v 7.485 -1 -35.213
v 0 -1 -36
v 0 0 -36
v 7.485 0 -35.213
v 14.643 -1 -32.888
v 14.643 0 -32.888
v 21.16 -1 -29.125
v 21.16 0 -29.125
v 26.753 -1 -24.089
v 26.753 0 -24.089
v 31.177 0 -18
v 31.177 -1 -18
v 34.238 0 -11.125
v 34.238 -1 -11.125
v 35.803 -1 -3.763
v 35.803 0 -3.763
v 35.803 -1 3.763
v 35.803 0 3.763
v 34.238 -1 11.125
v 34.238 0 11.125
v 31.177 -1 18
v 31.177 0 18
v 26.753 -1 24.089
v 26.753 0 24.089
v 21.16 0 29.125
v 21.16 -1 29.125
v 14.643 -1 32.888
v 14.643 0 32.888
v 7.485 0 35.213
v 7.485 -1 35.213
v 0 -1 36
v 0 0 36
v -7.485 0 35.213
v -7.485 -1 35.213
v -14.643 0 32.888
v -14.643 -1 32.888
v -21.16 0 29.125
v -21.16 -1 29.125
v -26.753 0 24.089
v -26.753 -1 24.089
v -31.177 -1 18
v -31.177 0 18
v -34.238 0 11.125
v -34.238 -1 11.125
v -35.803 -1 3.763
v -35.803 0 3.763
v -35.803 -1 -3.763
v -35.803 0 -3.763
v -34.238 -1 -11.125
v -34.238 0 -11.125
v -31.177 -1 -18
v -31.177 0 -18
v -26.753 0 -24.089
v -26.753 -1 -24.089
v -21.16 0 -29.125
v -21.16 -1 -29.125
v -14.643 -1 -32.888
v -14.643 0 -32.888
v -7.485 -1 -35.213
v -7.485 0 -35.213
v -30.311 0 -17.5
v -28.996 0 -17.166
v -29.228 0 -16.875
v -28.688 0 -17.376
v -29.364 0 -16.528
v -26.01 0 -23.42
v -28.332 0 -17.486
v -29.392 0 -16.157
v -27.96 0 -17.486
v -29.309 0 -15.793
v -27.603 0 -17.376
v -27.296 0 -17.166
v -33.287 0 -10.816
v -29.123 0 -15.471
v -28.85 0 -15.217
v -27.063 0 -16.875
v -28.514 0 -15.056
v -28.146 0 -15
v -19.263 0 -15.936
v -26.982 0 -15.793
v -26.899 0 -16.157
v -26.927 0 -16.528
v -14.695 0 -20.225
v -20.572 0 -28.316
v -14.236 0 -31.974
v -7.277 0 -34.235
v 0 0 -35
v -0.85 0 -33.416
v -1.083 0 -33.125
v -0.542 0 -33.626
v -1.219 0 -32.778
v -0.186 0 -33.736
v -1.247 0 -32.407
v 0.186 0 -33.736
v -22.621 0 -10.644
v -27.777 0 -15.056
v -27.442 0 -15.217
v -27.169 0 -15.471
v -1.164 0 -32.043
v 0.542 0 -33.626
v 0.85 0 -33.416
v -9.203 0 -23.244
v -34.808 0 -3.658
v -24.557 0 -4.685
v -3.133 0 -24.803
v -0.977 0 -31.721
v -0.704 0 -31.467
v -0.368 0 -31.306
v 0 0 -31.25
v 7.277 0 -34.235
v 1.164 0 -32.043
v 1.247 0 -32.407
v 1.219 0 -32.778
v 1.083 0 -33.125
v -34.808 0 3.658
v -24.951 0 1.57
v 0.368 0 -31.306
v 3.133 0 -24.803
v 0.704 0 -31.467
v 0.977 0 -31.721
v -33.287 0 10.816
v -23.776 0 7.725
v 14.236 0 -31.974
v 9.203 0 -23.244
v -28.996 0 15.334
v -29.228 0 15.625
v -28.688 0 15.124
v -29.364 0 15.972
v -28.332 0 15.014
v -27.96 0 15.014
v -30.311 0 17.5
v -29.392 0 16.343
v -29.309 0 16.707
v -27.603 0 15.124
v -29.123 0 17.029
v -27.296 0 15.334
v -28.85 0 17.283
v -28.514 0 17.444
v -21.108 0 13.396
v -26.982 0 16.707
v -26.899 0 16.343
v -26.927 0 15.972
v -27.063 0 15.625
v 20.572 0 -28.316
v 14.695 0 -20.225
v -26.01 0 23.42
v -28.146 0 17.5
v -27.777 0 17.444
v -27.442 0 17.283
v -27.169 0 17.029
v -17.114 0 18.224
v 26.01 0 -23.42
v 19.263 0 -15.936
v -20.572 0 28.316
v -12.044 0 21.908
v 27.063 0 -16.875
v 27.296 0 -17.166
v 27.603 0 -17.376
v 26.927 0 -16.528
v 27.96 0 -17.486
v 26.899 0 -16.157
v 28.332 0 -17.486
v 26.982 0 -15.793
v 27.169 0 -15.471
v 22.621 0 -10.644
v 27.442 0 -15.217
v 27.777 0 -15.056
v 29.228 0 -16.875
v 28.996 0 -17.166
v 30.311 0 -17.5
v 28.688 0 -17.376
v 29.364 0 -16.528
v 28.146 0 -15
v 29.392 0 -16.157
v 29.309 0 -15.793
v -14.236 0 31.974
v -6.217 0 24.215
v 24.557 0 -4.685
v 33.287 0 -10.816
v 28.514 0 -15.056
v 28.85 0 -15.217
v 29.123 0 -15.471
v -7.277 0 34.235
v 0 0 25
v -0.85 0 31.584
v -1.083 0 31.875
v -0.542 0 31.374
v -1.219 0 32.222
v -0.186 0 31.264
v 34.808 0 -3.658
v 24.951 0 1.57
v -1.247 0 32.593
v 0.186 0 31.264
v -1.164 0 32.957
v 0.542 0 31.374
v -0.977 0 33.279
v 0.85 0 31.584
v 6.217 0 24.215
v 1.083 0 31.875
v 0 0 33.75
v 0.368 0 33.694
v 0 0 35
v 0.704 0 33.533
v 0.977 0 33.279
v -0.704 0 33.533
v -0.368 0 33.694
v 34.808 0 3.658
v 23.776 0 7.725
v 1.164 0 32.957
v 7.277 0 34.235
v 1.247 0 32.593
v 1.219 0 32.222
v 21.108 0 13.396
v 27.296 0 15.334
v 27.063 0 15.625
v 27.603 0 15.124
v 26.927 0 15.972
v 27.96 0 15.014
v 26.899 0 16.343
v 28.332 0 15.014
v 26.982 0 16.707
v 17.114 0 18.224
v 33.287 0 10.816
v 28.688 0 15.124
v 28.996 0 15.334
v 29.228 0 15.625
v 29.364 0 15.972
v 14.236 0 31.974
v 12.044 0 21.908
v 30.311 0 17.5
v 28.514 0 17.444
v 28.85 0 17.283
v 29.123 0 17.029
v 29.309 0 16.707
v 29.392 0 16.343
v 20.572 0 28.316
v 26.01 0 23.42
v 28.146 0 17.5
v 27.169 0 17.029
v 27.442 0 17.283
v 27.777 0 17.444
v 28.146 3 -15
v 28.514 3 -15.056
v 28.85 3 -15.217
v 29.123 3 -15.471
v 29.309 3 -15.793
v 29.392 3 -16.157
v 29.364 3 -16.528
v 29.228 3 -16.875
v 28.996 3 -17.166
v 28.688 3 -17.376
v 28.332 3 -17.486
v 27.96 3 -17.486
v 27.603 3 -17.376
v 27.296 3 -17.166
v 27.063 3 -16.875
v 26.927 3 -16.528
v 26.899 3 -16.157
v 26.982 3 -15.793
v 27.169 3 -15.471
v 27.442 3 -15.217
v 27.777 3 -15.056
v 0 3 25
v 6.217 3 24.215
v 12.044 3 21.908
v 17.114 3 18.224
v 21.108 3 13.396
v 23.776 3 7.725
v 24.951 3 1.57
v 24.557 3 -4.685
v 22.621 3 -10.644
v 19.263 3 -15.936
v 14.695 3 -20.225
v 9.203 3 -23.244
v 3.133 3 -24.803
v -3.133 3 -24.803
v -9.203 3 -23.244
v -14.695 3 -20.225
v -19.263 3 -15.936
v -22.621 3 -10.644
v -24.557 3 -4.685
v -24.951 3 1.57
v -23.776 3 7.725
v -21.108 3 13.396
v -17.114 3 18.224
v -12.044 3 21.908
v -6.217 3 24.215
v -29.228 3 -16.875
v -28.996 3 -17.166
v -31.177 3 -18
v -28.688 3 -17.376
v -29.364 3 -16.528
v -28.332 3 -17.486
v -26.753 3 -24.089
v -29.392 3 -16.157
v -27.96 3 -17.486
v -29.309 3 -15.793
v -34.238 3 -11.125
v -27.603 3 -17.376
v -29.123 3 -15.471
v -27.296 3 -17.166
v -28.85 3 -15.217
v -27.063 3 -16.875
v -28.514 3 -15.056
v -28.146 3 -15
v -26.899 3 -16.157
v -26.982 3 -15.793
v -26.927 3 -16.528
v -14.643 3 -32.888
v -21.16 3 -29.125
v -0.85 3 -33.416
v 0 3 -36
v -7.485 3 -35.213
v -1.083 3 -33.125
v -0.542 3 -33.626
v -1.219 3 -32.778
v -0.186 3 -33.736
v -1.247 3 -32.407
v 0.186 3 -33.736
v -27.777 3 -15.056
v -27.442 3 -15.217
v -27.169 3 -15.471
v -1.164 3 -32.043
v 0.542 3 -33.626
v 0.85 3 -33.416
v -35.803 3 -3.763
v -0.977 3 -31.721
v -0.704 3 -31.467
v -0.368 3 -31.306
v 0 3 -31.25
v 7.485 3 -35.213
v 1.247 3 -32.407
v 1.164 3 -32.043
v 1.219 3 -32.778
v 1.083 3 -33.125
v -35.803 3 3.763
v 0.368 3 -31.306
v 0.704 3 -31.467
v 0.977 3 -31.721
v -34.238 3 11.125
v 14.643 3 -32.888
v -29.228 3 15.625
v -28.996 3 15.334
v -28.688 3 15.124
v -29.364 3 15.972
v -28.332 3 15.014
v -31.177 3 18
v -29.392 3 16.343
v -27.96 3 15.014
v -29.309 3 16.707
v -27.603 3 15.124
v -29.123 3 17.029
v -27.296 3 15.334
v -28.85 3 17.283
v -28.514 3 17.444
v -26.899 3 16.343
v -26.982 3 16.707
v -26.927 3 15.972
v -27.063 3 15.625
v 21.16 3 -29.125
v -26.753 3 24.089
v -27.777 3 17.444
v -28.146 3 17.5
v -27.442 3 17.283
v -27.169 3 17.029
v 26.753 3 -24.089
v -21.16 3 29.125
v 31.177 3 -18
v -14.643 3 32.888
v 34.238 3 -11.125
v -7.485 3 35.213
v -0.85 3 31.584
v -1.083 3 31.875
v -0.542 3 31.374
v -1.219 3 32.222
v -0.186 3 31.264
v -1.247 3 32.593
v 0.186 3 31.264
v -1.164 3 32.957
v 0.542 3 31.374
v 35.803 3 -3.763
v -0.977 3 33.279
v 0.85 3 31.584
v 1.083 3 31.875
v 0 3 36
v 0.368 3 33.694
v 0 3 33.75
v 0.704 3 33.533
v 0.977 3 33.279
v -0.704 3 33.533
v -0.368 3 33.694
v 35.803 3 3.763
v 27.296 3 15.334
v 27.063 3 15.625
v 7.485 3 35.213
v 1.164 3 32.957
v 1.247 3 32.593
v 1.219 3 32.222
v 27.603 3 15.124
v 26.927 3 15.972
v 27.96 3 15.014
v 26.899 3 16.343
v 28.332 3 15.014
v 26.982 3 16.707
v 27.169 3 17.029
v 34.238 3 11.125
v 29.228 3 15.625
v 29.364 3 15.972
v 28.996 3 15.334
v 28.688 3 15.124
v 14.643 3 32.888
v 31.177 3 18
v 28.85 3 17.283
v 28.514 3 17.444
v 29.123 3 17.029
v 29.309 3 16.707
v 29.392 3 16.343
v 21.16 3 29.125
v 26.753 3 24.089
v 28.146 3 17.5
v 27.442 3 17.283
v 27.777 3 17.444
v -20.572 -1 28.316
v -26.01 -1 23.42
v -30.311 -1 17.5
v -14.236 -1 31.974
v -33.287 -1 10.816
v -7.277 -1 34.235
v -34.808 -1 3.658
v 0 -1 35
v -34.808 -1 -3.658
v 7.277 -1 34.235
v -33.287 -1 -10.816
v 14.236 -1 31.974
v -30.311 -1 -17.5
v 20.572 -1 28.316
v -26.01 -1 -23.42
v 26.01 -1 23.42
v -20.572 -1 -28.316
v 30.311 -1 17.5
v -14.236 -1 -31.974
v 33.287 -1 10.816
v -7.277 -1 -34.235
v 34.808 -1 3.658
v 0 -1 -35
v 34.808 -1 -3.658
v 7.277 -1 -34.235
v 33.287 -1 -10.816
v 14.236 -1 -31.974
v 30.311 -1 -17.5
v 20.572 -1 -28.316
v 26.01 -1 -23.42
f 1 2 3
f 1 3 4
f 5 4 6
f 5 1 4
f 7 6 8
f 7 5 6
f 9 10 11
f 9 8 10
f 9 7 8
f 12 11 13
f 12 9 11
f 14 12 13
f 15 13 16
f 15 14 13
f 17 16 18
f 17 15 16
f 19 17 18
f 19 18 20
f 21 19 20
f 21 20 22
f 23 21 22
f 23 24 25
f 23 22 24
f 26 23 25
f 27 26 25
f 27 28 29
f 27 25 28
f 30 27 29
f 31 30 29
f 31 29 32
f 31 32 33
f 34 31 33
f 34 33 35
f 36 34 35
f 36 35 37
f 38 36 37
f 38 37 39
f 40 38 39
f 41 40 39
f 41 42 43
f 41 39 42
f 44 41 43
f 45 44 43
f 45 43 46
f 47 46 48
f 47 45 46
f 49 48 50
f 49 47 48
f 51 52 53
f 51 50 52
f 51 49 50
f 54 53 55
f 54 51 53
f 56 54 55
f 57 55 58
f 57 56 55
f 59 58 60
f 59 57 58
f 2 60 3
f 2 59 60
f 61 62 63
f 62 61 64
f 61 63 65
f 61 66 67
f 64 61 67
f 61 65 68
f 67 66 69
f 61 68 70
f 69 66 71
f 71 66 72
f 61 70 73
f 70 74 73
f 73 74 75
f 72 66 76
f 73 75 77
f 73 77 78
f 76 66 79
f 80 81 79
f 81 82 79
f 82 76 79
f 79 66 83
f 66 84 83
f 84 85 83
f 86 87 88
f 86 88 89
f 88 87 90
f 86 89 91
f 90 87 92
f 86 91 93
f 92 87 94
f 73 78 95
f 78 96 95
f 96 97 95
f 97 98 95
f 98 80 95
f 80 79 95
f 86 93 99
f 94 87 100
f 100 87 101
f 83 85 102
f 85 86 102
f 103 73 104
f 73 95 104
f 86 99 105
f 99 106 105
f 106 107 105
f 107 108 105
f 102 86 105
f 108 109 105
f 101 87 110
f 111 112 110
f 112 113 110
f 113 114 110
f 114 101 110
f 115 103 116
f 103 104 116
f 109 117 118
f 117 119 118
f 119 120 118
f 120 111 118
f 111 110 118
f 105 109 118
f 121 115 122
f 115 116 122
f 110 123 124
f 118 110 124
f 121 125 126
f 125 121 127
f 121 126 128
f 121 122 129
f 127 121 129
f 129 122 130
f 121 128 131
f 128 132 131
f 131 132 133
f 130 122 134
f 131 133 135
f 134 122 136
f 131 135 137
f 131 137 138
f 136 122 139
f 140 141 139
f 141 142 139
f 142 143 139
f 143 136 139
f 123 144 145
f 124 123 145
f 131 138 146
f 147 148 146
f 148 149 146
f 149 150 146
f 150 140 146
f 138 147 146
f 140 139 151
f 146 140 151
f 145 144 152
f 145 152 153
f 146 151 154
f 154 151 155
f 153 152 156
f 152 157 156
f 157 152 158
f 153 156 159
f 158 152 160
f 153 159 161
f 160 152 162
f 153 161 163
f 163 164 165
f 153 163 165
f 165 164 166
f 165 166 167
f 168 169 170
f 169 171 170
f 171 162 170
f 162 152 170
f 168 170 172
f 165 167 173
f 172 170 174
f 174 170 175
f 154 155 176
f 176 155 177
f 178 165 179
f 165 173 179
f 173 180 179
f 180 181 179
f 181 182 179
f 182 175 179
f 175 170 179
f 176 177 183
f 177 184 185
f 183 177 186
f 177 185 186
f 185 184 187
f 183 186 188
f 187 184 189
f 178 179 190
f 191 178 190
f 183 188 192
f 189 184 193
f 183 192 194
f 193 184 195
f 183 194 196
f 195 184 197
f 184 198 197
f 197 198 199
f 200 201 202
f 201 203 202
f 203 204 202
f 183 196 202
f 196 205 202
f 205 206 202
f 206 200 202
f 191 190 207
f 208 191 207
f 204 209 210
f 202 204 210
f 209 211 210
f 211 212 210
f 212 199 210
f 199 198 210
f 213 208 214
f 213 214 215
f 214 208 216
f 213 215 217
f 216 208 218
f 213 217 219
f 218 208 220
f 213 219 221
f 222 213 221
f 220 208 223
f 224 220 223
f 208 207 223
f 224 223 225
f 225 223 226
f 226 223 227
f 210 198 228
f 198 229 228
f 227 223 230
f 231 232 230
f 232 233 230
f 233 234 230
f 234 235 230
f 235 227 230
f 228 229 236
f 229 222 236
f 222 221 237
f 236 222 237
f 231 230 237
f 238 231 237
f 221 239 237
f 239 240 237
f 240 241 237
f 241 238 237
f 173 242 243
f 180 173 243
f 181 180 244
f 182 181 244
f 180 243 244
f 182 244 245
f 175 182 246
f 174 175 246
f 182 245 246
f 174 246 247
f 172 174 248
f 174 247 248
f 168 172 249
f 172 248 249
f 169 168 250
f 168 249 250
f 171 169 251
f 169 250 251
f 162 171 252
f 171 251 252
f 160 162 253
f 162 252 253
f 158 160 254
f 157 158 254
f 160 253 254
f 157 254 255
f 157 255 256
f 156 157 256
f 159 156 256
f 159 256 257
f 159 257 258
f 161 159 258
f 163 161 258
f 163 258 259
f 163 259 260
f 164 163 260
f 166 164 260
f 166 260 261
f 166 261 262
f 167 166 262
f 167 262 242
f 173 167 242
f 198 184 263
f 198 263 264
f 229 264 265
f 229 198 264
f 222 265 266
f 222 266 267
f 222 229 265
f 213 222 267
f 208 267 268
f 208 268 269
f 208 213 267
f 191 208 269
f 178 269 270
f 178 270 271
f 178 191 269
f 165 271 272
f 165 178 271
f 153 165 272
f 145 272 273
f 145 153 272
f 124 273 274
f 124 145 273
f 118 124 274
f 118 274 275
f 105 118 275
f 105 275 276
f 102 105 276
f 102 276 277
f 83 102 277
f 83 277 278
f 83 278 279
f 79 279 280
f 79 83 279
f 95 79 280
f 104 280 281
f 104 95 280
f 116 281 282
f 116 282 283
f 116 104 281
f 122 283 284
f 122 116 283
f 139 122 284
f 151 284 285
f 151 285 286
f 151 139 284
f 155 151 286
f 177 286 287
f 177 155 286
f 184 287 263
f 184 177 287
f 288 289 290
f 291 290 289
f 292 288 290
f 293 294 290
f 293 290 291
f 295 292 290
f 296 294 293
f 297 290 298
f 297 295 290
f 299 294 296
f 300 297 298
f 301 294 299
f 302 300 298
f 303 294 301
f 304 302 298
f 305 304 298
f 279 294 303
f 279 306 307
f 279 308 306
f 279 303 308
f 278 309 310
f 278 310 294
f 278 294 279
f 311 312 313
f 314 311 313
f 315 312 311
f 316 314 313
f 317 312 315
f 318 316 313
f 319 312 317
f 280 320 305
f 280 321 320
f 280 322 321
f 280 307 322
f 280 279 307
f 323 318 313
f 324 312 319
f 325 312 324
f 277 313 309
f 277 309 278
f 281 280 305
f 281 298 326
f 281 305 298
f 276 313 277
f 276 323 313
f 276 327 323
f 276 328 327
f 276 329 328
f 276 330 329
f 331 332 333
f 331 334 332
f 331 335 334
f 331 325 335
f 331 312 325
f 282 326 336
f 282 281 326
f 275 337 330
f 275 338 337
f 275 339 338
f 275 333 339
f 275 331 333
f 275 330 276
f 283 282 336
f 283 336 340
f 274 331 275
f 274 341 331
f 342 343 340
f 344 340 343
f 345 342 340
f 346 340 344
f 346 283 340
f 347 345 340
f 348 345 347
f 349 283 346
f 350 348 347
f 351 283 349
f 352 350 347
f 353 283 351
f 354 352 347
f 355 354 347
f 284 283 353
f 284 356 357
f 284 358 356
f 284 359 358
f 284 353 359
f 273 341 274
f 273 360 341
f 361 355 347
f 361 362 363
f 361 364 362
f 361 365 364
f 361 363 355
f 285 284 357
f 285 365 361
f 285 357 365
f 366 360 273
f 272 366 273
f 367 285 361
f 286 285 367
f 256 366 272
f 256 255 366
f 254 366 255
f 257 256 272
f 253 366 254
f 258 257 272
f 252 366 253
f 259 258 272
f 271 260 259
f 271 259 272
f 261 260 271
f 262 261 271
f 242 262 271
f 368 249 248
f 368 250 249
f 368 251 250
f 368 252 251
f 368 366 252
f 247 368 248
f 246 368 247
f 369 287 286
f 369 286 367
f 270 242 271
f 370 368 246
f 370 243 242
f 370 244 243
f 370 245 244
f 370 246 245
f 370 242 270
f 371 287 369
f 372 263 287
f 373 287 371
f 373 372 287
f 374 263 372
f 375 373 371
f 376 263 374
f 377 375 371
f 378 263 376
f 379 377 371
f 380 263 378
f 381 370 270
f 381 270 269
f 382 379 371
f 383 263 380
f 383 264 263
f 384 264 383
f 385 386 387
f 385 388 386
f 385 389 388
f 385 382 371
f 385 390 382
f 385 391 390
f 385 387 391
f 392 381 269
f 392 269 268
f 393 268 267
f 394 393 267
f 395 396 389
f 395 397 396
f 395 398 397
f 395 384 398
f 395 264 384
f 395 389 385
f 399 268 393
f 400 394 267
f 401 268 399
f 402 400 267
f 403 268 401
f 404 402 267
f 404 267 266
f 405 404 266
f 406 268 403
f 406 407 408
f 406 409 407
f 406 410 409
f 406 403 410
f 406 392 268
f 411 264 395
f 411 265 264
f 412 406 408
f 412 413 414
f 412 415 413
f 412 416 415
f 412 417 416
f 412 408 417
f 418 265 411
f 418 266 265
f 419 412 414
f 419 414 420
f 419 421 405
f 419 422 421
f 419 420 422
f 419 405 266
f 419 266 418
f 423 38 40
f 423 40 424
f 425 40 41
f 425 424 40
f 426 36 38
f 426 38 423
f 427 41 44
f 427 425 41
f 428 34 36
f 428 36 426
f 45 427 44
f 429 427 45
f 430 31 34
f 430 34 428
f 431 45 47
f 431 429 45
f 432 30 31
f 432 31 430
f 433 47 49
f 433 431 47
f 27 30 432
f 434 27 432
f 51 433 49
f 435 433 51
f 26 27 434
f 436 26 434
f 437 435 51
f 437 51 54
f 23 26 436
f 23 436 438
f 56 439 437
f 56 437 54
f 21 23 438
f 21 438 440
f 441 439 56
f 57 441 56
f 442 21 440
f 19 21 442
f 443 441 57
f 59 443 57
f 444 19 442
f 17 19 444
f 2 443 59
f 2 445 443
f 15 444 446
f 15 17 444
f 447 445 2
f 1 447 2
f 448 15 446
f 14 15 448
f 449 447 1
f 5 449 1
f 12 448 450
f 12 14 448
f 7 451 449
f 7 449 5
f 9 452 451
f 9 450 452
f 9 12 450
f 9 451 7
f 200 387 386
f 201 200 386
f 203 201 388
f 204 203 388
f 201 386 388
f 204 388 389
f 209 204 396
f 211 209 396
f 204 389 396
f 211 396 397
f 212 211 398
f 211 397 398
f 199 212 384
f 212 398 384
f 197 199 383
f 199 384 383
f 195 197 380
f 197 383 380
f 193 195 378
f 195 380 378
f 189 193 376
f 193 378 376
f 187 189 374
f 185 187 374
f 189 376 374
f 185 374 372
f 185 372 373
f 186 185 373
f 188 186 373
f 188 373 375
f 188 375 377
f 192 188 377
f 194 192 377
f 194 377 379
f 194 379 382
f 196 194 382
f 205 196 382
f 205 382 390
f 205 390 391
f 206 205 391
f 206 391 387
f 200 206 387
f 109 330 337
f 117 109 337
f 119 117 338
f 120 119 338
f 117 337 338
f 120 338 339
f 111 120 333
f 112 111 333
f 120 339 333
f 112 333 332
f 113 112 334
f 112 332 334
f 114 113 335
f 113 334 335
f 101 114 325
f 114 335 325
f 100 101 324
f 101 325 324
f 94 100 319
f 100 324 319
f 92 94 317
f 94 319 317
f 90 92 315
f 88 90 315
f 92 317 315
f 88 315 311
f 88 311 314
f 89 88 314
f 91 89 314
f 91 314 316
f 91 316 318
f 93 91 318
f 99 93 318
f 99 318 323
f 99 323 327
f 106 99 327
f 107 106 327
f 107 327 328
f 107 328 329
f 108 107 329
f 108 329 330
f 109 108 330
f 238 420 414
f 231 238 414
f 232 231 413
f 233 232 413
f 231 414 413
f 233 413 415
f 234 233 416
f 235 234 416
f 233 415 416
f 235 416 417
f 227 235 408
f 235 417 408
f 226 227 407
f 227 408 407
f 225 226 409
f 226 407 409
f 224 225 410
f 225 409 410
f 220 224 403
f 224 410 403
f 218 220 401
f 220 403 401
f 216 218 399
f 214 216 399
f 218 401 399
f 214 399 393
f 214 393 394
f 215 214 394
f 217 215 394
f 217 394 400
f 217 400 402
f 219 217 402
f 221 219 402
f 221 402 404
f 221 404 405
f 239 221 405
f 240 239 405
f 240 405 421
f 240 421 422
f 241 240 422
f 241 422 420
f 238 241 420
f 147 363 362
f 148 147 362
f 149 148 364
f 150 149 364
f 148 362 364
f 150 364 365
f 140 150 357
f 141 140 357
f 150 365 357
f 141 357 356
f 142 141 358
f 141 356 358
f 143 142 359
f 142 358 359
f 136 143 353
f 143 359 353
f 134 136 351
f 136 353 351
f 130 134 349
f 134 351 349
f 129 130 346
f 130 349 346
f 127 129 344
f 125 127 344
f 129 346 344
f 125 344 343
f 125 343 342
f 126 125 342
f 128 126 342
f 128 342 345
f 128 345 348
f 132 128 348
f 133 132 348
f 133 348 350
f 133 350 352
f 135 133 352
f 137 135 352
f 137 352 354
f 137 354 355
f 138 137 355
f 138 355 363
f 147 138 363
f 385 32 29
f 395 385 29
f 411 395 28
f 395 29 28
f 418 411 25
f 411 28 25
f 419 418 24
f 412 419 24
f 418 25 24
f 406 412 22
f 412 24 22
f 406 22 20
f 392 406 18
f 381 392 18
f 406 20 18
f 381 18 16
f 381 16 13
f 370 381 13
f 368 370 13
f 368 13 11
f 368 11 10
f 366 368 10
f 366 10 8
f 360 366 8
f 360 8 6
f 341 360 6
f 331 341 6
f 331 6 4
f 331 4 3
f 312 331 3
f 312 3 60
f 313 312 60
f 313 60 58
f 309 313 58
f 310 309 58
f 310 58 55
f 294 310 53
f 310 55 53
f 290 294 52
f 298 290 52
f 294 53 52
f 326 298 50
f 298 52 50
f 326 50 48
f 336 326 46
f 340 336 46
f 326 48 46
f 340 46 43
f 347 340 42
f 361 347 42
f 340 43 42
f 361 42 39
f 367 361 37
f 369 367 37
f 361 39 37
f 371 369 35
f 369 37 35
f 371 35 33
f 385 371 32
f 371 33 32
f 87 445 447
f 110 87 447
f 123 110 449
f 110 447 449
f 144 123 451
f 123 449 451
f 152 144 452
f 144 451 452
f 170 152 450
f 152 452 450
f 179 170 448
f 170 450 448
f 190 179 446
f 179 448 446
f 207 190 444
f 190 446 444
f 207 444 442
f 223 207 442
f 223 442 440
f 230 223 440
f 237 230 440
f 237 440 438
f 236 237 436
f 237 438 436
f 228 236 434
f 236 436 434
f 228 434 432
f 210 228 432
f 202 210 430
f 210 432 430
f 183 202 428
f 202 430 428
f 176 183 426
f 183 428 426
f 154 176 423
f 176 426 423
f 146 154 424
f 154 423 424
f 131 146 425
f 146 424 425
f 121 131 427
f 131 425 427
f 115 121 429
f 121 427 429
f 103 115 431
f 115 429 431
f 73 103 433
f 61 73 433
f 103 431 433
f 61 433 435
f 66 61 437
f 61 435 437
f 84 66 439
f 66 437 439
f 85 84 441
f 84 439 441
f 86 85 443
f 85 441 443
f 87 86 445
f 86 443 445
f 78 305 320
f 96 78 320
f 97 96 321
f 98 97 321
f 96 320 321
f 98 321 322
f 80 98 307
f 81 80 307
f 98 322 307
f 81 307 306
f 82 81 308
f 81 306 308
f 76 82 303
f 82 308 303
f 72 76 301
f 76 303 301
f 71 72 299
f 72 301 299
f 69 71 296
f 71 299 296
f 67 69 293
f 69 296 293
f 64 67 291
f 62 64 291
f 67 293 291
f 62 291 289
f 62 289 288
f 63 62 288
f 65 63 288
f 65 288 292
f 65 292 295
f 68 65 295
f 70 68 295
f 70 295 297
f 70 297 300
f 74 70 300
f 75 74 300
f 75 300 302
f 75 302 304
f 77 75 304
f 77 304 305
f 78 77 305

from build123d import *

# Parameters (mm, degrees)
SKETCH_1_R           = 36
SKETCH_1_R_2         = 25
EXTRUDE_1_DEPTH      = 3
EXTRUDE_START        = 1
SKETCH_3_R           = 36
SKETCH_3_R_2         = 35
EXTRUDE_2_DEPTH      = 1
HOLE_WIZARD_M2_5_1_D = 2.5


with BuildPart() as part:
    # 草图1 → 凸台-拉伸1 (new body)
    with BuildSketch(Plane(origin=(0, 0, 0), x_dir=(1, 0, 0), z_dir=(0, 1, 0))):
        with Locations(Location((0, 0, 0), (0, 0, 270))):
            Circle(SKETCH_1_R)
        with Locations(Location((0, 0, 0), (0, 0, 270))):
            Circle(SKETCH_1_R_2, mode=Mode.SUBTRACT)
    extrude(amount=EXTRUDE_1_DEPTH)

    # 草图3 → 凸台-拉伸2 (add)
    with BuildSketch(Plane.XZ.offset(EXTRUDE_START)):
        with Locations(Location((0, 0, 0), (0, 0, 270))):
            Circle(SKETCH_3_R)
        with Locations(Location((0, 0, 0), (0, 0, 270))):
            Circle(SKETCH_3_R_2, mode=Mode.SUBTRACT)
    extrude(amount=-EXTRUDE_2_DEPTH)

    # M2.5 螺纹孔1 (through all)
    with Locations(Plane(origin=(0, 0, 32.5), x_dir=(0, 0, -1), z_dir=(0, -1, 0))):
        with Locations((0, 0), (16.25, 28.145825623), (48.75, 28.145825623), (16.25, -28.145825623), (48.75, -28.145825623), (65, 0)):
            Hole(HOLE_WIZARD_M2_5_1_D / 2)


solid = part.part
